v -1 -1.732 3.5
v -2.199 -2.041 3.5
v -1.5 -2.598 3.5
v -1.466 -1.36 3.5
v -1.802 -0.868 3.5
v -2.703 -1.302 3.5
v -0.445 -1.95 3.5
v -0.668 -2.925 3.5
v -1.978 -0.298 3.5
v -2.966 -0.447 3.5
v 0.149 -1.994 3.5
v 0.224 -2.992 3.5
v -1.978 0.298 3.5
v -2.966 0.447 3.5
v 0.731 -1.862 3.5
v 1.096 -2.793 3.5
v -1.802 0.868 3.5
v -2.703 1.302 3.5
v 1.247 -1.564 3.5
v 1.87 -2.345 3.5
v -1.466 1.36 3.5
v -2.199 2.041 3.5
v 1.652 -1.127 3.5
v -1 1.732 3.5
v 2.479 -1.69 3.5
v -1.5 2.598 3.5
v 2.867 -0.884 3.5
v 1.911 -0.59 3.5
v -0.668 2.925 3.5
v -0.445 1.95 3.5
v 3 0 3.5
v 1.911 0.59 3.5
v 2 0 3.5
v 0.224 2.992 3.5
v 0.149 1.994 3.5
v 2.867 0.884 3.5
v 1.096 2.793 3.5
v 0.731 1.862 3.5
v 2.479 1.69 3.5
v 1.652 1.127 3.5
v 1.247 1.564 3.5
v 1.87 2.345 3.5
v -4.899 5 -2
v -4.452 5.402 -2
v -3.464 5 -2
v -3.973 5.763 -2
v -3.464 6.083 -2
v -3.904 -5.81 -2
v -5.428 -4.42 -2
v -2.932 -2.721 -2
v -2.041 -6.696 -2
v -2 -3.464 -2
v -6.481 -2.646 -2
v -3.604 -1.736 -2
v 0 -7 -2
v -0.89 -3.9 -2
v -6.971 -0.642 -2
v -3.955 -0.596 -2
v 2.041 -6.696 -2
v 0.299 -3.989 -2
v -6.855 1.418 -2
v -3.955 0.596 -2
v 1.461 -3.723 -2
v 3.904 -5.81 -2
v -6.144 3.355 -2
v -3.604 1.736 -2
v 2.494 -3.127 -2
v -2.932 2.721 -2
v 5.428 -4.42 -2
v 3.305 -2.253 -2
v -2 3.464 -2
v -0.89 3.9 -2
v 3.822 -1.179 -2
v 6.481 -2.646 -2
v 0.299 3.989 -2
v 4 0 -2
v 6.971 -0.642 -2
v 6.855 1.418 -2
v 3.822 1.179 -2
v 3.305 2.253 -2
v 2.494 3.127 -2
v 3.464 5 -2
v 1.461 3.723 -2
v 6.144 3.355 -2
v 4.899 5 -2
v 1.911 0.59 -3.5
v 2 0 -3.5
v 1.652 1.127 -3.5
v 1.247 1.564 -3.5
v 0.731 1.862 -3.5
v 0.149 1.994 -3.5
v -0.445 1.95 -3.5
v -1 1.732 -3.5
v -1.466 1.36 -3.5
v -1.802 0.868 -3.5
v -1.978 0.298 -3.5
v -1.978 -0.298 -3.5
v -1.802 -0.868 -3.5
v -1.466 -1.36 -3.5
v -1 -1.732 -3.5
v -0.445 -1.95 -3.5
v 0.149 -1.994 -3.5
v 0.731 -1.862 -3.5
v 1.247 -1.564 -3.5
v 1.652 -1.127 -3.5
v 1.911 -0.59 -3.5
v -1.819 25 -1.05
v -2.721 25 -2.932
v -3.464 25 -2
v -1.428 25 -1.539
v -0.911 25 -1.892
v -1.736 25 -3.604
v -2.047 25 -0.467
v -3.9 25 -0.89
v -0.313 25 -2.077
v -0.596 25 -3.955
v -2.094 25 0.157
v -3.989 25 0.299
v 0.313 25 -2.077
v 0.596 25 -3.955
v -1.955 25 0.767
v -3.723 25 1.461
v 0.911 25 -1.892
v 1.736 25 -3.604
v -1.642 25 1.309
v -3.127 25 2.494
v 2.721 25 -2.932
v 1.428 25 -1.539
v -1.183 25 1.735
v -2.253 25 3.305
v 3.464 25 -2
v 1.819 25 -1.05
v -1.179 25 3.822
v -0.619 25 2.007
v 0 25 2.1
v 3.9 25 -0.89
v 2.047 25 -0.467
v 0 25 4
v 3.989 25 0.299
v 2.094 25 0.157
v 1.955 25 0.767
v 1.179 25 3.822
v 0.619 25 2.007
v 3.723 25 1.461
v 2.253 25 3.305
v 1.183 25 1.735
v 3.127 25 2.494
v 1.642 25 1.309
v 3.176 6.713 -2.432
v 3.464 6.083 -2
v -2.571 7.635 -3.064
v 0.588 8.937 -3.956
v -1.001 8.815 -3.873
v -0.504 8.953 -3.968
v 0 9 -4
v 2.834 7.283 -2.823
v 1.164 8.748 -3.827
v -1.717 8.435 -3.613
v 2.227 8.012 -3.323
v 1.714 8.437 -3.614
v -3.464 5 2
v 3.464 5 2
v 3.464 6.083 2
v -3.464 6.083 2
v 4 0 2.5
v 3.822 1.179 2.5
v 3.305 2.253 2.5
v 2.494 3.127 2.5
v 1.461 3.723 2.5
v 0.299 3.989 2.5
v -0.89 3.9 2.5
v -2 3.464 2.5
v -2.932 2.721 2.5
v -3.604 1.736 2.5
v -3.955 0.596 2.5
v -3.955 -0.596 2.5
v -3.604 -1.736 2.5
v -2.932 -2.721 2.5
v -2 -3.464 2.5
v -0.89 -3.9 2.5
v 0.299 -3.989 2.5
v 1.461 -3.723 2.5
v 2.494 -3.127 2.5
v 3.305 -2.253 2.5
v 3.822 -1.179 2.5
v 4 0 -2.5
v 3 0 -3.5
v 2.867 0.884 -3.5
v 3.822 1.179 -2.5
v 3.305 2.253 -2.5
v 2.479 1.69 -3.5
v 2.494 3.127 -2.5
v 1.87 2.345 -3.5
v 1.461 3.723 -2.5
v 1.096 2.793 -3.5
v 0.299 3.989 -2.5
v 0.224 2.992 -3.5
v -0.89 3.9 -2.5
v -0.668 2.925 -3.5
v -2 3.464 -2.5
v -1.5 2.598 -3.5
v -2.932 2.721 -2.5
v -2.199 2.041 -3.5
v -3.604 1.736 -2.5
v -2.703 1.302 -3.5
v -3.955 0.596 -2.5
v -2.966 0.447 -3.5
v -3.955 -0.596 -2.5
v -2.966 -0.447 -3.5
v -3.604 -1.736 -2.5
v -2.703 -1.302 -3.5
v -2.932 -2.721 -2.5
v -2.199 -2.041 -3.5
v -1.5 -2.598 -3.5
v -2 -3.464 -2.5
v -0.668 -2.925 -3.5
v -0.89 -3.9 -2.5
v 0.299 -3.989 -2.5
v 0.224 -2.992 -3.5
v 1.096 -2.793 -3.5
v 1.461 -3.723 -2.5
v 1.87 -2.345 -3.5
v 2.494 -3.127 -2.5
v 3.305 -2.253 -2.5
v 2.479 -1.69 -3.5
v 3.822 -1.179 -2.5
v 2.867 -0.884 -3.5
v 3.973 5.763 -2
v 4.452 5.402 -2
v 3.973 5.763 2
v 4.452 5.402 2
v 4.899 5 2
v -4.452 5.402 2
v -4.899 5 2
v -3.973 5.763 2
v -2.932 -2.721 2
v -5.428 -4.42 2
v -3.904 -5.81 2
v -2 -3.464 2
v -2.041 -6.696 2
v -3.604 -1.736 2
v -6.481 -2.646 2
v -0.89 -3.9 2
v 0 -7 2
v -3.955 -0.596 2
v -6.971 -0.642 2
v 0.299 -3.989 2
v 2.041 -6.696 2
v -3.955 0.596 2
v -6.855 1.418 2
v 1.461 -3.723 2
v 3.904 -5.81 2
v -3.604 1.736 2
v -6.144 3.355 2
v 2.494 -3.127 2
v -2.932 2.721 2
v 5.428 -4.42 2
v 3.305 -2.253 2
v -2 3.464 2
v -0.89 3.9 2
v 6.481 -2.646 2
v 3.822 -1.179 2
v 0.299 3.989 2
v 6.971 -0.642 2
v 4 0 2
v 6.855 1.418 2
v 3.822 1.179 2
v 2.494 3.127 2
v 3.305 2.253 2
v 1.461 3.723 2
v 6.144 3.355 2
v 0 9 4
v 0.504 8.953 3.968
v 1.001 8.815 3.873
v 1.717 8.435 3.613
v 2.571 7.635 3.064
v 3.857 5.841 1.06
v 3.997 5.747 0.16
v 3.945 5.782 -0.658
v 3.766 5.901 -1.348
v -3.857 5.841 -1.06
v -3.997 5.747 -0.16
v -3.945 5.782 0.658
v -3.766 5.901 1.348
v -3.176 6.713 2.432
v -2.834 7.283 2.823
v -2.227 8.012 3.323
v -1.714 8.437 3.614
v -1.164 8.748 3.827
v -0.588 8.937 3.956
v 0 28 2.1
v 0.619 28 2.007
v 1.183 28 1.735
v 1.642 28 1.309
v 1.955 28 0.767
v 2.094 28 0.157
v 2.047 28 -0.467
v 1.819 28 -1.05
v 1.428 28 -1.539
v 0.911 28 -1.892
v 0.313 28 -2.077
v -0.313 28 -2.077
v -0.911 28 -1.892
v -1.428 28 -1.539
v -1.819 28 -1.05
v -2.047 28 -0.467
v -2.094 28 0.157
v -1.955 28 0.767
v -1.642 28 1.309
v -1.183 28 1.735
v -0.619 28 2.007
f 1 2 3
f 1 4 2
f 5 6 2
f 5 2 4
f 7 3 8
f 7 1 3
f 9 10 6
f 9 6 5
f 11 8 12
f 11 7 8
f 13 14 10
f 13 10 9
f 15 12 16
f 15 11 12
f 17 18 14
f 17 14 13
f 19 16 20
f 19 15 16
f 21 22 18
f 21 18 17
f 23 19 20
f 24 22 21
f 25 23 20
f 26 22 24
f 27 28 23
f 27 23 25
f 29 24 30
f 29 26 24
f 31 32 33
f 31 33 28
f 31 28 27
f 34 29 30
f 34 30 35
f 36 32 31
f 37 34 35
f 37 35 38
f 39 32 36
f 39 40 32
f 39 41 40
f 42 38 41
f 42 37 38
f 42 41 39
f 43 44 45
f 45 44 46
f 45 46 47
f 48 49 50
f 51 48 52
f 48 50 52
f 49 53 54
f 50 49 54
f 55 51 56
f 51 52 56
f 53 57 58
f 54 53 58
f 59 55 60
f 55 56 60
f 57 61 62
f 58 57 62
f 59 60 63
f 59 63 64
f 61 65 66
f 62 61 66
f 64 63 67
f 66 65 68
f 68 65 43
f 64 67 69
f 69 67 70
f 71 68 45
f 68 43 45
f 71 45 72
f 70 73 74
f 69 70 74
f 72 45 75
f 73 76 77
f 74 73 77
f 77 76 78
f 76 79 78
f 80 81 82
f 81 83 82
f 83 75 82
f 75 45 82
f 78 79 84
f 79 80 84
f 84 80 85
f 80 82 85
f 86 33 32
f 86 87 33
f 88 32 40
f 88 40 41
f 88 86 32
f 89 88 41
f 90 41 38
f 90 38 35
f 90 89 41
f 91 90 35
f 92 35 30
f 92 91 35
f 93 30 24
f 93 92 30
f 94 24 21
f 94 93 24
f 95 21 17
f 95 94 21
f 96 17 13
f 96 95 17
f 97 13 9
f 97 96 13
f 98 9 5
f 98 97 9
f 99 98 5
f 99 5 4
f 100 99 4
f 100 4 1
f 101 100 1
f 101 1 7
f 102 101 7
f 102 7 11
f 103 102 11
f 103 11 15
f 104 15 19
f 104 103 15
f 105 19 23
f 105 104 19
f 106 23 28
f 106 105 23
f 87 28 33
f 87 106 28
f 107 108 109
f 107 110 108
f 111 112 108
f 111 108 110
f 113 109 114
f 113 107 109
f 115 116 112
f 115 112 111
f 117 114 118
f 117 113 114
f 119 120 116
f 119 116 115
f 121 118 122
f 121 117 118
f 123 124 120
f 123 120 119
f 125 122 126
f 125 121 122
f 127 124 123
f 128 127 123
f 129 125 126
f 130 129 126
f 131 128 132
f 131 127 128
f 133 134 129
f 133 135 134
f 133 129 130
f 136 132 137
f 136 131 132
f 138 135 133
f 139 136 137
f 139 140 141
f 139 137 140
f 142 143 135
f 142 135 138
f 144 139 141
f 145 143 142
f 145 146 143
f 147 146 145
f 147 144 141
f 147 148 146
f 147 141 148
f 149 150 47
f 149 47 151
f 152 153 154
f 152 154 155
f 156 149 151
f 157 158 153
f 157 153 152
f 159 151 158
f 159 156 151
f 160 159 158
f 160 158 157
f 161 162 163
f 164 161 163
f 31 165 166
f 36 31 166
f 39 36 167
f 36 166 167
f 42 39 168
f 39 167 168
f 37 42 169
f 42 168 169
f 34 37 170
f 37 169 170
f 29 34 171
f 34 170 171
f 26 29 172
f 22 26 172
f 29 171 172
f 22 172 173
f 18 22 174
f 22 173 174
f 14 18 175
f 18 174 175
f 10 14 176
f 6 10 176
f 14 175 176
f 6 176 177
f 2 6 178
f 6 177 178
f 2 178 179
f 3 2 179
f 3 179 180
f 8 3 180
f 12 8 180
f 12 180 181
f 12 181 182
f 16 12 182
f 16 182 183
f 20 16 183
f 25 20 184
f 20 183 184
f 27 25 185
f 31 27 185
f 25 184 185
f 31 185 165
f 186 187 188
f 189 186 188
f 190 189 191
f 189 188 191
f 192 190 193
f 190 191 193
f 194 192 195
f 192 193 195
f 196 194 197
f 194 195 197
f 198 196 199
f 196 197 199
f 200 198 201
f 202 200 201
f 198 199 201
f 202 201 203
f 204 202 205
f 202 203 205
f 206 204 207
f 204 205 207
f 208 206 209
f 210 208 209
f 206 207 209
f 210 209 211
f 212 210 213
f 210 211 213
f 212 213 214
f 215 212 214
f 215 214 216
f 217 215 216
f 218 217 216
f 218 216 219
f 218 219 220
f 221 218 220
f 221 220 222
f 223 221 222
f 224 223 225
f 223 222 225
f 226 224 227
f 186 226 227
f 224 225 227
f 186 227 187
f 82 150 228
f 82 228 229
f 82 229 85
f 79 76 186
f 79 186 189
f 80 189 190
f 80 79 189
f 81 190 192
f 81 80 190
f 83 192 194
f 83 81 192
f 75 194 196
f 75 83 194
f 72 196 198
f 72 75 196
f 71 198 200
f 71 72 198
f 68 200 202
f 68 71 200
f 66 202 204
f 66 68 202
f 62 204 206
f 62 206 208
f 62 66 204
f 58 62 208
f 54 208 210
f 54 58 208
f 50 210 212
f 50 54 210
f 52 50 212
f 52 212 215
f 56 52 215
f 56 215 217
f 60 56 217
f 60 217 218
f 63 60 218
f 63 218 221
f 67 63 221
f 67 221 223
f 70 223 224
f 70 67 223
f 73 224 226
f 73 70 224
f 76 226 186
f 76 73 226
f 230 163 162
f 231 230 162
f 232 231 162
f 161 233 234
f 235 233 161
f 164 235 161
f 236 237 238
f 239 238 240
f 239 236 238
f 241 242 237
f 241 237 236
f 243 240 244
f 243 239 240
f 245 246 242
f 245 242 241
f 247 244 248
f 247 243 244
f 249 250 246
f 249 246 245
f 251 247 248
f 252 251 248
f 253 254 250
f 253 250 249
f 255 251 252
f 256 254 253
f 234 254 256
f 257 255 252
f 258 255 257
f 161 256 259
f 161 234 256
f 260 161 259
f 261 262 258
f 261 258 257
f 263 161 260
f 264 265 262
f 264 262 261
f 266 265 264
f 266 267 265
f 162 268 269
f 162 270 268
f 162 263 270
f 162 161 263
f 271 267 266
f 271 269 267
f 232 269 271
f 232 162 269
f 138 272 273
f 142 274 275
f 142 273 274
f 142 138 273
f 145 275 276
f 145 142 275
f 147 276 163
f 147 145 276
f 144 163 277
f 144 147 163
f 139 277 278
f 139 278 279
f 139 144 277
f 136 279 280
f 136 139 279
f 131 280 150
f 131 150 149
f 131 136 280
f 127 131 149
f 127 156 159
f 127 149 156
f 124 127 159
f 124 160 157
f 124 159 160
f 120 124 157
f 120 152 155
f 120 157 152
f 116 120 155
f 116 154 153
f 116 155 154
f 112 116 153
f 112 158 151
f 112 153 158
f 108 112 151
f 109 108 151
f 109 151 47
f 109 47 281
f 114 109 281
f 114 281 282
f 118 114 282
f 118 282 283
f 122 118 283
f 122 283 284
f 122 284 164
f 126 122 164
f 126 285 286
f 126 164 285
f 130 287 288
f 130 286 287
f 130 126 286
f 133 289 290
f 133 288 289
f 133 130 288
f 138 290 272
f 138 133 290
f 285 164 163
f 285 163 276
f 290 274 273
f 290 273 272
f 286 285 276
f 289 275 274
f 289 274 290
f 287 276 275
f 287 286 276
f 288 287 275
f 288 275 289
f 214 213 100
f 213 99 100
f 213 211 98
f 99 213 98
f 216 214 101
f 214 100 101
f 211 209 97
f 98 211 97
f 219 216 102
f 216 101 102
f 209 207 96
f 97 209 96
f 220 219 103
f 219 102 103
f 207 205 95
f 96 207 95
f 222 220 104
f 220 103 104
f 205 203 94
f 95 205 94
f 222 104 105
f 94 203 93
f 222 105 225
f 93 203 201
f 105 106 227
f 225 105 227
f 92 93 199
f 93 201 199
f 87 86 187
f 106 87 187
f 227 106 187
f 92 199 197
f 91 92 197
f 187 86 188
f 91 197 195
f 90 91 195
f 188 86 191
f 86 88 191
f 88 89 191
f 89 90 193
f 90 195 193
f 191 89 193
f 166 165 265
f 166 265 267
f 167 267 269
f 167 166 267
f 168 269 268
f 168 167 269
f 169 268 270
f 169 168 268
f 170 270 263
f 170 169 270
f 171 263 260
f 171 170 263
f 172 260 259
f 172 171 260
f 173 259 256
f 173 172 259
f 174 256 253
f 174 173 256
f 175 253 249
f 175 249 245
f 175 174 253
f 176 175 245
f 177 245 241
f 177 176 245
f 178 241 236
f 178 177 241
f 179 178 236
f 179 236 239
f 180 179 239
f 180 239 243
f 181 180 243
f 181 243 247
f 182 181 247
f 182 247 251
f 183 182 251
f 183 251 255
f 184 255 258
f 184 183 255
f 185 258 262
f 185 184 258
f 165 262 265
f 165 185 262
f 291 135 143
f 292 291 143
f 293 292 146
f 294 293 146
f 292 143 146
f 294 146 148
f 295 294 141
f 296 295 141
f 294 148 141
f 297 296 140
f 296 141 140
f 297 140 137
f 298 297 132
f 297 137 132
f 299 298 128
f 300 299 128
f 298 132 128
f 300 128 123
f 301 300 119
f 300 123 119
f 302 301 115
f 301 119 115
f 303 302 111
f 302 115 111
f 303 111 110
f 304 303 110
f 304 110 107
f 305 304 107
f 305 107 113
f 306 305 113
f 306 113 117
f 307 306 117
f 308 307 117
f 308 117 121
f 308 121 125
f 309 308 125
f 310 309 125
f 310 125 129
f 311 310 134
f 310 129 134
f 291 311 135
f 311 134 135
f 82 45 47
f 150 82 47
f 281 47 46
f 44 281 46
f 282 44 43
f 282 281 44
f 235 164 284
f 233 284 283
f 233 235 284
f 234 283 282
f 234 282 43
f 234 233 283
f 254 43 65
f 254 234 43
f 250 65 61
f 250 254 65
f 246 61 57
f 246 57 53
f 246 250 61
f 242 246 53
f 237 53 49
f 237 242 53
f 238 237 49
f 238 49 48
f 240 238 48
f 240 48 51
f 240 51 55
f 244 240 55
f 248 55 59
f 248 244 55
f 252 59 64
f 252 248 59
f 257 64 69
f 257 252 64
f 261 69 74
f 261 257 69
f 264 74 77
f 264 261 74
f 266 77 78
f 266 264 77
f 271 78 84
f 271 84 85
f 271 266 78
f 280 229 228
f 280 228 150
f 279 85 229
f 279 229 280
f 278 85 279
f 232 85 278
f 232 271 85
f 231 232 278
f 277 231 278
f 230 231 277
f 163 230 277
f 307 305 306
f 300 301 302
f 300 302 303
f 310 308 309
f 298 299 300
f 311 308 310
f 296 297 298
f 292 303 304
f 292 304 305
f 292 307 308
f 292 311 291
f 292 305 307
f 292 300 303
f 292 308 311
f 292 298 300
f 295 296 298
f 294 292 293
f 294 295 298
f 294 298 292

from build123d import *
from build123d.topology import SkipClean

# Parameters (mm, degrees)
SKETCH_1_R          = 7
SKETCH_1_R_2        = 4
EXTRUDE_1_DEPTH     = 2
SKETCH_2_R          = 4
SKETCH_2_R_2        = 2
EXTRUDE_2_DEPTH     = 3.5
CHAMFER_1_SIZE      = 1
SKETCH_4_R          = 4
EXTRUDE_3_DEPTH     = 20
CUT_EXTRUDE_1_DEPTH = 5
CUT_EXTRUDE_2_DEPTH = 5
SKETCH_9_R          = 2.1
EXTRUDE_4_DEPTH     = 3


with BuildPart() as part:
    # 草图1 → 凸台-拉伸1 (new, symmetric)
    with BuildSketch(Plane.XY):
        Circle(SKETCH_1_R)
        Circle(SKETCH_1_R_2, mode=Mode.SUBTRACT)
    extrude(amount=EXTRUDE_1_DEPTH, both=True)

    # 草图2 → 凸台-拉伸2 (add, symmetric)
    with BuildSketch(Plane.XY):
        Circle(SKETCH_2_R)
        Circle(SKETCH_2_R_2, mode=Mode.SUBTRACT)
    extrude(amount=EXTRUDE_2_DEPTH, both=True)

    # 倒角1
    chamfer_1_edges = [part.edges().sort_by_distance(p)[0] for p in [
        (-4, 0, -3.5),
        (-4, 0, 3.5),
    ]]
    chamfer(chamfer_1_edges, length=CHAMFER_1_SIZE)

    # 草图4 → 凸台-拉伸3 (add)
    with BuildSketch(Plane(origin=(0, 25, 0), x_dir=(1, 0, 0), z_dir=(0, 1, 0))):
        with Locations(Location((0, 0, 0), (0, 0, 270))):
            Circle(SKETCH_4_R)
    extrude(amount=-EXTRUDE_3_DEPTH)

    # 草图7 → 切除-拉伸1 (cut, symmetric)
    with BuildSketch(Plane(origin=(0, 0, 0), x_dir=(0, 0, -1), z_dir=(1, 0, 0))):
        Polygon((2, 5), (4, 9), (4, 5), align=None)
        Polygon((-2, 5), (-4, 9), (-4, 5), align=None)
    extrude(amount=CUT_EXTRUDE_1_DEPTH, both=True, mode=Mode.SUBTRACT)

    # 草图8 → 切除-拉伸2 (cut, symmetric)
    with SkipClean():  # the faces are left unmerged after this step: merging them gives an invalid solid
        with BuildSketch(Plane(origin=(0, 0, 0), x_dir=(0, 0, -1), z_dir=(1, 0, 0))):
            Polygon((-2, 5), (-2, 6.08276253), (-4, 9), align=None)
            Polygon((2, 5), (2, 6.08276253), (4, 9), align=None)
        extrude(amount=CUT_EXTRUDE_2_DEPTH, both=True, mode=Mode.SUBTRACT)

    # 草图9 → 凸台-拉伸4 (add)
    with SkipClean():  # the faces are left unmerged after this step: merging them gives an invalid solid
        with BuildSketch(Plane(origin=(0, 25, 0), x_dir=(1, 0, 0), z_dir=(0, 1, 0))):
            with Locations(Location((0, 0, 0), (0, 0, 270))):
                Circle(SKETCH_9_R)
        extrude(amount=EXTRUDE_4_DEPTH)


solid = part.part
